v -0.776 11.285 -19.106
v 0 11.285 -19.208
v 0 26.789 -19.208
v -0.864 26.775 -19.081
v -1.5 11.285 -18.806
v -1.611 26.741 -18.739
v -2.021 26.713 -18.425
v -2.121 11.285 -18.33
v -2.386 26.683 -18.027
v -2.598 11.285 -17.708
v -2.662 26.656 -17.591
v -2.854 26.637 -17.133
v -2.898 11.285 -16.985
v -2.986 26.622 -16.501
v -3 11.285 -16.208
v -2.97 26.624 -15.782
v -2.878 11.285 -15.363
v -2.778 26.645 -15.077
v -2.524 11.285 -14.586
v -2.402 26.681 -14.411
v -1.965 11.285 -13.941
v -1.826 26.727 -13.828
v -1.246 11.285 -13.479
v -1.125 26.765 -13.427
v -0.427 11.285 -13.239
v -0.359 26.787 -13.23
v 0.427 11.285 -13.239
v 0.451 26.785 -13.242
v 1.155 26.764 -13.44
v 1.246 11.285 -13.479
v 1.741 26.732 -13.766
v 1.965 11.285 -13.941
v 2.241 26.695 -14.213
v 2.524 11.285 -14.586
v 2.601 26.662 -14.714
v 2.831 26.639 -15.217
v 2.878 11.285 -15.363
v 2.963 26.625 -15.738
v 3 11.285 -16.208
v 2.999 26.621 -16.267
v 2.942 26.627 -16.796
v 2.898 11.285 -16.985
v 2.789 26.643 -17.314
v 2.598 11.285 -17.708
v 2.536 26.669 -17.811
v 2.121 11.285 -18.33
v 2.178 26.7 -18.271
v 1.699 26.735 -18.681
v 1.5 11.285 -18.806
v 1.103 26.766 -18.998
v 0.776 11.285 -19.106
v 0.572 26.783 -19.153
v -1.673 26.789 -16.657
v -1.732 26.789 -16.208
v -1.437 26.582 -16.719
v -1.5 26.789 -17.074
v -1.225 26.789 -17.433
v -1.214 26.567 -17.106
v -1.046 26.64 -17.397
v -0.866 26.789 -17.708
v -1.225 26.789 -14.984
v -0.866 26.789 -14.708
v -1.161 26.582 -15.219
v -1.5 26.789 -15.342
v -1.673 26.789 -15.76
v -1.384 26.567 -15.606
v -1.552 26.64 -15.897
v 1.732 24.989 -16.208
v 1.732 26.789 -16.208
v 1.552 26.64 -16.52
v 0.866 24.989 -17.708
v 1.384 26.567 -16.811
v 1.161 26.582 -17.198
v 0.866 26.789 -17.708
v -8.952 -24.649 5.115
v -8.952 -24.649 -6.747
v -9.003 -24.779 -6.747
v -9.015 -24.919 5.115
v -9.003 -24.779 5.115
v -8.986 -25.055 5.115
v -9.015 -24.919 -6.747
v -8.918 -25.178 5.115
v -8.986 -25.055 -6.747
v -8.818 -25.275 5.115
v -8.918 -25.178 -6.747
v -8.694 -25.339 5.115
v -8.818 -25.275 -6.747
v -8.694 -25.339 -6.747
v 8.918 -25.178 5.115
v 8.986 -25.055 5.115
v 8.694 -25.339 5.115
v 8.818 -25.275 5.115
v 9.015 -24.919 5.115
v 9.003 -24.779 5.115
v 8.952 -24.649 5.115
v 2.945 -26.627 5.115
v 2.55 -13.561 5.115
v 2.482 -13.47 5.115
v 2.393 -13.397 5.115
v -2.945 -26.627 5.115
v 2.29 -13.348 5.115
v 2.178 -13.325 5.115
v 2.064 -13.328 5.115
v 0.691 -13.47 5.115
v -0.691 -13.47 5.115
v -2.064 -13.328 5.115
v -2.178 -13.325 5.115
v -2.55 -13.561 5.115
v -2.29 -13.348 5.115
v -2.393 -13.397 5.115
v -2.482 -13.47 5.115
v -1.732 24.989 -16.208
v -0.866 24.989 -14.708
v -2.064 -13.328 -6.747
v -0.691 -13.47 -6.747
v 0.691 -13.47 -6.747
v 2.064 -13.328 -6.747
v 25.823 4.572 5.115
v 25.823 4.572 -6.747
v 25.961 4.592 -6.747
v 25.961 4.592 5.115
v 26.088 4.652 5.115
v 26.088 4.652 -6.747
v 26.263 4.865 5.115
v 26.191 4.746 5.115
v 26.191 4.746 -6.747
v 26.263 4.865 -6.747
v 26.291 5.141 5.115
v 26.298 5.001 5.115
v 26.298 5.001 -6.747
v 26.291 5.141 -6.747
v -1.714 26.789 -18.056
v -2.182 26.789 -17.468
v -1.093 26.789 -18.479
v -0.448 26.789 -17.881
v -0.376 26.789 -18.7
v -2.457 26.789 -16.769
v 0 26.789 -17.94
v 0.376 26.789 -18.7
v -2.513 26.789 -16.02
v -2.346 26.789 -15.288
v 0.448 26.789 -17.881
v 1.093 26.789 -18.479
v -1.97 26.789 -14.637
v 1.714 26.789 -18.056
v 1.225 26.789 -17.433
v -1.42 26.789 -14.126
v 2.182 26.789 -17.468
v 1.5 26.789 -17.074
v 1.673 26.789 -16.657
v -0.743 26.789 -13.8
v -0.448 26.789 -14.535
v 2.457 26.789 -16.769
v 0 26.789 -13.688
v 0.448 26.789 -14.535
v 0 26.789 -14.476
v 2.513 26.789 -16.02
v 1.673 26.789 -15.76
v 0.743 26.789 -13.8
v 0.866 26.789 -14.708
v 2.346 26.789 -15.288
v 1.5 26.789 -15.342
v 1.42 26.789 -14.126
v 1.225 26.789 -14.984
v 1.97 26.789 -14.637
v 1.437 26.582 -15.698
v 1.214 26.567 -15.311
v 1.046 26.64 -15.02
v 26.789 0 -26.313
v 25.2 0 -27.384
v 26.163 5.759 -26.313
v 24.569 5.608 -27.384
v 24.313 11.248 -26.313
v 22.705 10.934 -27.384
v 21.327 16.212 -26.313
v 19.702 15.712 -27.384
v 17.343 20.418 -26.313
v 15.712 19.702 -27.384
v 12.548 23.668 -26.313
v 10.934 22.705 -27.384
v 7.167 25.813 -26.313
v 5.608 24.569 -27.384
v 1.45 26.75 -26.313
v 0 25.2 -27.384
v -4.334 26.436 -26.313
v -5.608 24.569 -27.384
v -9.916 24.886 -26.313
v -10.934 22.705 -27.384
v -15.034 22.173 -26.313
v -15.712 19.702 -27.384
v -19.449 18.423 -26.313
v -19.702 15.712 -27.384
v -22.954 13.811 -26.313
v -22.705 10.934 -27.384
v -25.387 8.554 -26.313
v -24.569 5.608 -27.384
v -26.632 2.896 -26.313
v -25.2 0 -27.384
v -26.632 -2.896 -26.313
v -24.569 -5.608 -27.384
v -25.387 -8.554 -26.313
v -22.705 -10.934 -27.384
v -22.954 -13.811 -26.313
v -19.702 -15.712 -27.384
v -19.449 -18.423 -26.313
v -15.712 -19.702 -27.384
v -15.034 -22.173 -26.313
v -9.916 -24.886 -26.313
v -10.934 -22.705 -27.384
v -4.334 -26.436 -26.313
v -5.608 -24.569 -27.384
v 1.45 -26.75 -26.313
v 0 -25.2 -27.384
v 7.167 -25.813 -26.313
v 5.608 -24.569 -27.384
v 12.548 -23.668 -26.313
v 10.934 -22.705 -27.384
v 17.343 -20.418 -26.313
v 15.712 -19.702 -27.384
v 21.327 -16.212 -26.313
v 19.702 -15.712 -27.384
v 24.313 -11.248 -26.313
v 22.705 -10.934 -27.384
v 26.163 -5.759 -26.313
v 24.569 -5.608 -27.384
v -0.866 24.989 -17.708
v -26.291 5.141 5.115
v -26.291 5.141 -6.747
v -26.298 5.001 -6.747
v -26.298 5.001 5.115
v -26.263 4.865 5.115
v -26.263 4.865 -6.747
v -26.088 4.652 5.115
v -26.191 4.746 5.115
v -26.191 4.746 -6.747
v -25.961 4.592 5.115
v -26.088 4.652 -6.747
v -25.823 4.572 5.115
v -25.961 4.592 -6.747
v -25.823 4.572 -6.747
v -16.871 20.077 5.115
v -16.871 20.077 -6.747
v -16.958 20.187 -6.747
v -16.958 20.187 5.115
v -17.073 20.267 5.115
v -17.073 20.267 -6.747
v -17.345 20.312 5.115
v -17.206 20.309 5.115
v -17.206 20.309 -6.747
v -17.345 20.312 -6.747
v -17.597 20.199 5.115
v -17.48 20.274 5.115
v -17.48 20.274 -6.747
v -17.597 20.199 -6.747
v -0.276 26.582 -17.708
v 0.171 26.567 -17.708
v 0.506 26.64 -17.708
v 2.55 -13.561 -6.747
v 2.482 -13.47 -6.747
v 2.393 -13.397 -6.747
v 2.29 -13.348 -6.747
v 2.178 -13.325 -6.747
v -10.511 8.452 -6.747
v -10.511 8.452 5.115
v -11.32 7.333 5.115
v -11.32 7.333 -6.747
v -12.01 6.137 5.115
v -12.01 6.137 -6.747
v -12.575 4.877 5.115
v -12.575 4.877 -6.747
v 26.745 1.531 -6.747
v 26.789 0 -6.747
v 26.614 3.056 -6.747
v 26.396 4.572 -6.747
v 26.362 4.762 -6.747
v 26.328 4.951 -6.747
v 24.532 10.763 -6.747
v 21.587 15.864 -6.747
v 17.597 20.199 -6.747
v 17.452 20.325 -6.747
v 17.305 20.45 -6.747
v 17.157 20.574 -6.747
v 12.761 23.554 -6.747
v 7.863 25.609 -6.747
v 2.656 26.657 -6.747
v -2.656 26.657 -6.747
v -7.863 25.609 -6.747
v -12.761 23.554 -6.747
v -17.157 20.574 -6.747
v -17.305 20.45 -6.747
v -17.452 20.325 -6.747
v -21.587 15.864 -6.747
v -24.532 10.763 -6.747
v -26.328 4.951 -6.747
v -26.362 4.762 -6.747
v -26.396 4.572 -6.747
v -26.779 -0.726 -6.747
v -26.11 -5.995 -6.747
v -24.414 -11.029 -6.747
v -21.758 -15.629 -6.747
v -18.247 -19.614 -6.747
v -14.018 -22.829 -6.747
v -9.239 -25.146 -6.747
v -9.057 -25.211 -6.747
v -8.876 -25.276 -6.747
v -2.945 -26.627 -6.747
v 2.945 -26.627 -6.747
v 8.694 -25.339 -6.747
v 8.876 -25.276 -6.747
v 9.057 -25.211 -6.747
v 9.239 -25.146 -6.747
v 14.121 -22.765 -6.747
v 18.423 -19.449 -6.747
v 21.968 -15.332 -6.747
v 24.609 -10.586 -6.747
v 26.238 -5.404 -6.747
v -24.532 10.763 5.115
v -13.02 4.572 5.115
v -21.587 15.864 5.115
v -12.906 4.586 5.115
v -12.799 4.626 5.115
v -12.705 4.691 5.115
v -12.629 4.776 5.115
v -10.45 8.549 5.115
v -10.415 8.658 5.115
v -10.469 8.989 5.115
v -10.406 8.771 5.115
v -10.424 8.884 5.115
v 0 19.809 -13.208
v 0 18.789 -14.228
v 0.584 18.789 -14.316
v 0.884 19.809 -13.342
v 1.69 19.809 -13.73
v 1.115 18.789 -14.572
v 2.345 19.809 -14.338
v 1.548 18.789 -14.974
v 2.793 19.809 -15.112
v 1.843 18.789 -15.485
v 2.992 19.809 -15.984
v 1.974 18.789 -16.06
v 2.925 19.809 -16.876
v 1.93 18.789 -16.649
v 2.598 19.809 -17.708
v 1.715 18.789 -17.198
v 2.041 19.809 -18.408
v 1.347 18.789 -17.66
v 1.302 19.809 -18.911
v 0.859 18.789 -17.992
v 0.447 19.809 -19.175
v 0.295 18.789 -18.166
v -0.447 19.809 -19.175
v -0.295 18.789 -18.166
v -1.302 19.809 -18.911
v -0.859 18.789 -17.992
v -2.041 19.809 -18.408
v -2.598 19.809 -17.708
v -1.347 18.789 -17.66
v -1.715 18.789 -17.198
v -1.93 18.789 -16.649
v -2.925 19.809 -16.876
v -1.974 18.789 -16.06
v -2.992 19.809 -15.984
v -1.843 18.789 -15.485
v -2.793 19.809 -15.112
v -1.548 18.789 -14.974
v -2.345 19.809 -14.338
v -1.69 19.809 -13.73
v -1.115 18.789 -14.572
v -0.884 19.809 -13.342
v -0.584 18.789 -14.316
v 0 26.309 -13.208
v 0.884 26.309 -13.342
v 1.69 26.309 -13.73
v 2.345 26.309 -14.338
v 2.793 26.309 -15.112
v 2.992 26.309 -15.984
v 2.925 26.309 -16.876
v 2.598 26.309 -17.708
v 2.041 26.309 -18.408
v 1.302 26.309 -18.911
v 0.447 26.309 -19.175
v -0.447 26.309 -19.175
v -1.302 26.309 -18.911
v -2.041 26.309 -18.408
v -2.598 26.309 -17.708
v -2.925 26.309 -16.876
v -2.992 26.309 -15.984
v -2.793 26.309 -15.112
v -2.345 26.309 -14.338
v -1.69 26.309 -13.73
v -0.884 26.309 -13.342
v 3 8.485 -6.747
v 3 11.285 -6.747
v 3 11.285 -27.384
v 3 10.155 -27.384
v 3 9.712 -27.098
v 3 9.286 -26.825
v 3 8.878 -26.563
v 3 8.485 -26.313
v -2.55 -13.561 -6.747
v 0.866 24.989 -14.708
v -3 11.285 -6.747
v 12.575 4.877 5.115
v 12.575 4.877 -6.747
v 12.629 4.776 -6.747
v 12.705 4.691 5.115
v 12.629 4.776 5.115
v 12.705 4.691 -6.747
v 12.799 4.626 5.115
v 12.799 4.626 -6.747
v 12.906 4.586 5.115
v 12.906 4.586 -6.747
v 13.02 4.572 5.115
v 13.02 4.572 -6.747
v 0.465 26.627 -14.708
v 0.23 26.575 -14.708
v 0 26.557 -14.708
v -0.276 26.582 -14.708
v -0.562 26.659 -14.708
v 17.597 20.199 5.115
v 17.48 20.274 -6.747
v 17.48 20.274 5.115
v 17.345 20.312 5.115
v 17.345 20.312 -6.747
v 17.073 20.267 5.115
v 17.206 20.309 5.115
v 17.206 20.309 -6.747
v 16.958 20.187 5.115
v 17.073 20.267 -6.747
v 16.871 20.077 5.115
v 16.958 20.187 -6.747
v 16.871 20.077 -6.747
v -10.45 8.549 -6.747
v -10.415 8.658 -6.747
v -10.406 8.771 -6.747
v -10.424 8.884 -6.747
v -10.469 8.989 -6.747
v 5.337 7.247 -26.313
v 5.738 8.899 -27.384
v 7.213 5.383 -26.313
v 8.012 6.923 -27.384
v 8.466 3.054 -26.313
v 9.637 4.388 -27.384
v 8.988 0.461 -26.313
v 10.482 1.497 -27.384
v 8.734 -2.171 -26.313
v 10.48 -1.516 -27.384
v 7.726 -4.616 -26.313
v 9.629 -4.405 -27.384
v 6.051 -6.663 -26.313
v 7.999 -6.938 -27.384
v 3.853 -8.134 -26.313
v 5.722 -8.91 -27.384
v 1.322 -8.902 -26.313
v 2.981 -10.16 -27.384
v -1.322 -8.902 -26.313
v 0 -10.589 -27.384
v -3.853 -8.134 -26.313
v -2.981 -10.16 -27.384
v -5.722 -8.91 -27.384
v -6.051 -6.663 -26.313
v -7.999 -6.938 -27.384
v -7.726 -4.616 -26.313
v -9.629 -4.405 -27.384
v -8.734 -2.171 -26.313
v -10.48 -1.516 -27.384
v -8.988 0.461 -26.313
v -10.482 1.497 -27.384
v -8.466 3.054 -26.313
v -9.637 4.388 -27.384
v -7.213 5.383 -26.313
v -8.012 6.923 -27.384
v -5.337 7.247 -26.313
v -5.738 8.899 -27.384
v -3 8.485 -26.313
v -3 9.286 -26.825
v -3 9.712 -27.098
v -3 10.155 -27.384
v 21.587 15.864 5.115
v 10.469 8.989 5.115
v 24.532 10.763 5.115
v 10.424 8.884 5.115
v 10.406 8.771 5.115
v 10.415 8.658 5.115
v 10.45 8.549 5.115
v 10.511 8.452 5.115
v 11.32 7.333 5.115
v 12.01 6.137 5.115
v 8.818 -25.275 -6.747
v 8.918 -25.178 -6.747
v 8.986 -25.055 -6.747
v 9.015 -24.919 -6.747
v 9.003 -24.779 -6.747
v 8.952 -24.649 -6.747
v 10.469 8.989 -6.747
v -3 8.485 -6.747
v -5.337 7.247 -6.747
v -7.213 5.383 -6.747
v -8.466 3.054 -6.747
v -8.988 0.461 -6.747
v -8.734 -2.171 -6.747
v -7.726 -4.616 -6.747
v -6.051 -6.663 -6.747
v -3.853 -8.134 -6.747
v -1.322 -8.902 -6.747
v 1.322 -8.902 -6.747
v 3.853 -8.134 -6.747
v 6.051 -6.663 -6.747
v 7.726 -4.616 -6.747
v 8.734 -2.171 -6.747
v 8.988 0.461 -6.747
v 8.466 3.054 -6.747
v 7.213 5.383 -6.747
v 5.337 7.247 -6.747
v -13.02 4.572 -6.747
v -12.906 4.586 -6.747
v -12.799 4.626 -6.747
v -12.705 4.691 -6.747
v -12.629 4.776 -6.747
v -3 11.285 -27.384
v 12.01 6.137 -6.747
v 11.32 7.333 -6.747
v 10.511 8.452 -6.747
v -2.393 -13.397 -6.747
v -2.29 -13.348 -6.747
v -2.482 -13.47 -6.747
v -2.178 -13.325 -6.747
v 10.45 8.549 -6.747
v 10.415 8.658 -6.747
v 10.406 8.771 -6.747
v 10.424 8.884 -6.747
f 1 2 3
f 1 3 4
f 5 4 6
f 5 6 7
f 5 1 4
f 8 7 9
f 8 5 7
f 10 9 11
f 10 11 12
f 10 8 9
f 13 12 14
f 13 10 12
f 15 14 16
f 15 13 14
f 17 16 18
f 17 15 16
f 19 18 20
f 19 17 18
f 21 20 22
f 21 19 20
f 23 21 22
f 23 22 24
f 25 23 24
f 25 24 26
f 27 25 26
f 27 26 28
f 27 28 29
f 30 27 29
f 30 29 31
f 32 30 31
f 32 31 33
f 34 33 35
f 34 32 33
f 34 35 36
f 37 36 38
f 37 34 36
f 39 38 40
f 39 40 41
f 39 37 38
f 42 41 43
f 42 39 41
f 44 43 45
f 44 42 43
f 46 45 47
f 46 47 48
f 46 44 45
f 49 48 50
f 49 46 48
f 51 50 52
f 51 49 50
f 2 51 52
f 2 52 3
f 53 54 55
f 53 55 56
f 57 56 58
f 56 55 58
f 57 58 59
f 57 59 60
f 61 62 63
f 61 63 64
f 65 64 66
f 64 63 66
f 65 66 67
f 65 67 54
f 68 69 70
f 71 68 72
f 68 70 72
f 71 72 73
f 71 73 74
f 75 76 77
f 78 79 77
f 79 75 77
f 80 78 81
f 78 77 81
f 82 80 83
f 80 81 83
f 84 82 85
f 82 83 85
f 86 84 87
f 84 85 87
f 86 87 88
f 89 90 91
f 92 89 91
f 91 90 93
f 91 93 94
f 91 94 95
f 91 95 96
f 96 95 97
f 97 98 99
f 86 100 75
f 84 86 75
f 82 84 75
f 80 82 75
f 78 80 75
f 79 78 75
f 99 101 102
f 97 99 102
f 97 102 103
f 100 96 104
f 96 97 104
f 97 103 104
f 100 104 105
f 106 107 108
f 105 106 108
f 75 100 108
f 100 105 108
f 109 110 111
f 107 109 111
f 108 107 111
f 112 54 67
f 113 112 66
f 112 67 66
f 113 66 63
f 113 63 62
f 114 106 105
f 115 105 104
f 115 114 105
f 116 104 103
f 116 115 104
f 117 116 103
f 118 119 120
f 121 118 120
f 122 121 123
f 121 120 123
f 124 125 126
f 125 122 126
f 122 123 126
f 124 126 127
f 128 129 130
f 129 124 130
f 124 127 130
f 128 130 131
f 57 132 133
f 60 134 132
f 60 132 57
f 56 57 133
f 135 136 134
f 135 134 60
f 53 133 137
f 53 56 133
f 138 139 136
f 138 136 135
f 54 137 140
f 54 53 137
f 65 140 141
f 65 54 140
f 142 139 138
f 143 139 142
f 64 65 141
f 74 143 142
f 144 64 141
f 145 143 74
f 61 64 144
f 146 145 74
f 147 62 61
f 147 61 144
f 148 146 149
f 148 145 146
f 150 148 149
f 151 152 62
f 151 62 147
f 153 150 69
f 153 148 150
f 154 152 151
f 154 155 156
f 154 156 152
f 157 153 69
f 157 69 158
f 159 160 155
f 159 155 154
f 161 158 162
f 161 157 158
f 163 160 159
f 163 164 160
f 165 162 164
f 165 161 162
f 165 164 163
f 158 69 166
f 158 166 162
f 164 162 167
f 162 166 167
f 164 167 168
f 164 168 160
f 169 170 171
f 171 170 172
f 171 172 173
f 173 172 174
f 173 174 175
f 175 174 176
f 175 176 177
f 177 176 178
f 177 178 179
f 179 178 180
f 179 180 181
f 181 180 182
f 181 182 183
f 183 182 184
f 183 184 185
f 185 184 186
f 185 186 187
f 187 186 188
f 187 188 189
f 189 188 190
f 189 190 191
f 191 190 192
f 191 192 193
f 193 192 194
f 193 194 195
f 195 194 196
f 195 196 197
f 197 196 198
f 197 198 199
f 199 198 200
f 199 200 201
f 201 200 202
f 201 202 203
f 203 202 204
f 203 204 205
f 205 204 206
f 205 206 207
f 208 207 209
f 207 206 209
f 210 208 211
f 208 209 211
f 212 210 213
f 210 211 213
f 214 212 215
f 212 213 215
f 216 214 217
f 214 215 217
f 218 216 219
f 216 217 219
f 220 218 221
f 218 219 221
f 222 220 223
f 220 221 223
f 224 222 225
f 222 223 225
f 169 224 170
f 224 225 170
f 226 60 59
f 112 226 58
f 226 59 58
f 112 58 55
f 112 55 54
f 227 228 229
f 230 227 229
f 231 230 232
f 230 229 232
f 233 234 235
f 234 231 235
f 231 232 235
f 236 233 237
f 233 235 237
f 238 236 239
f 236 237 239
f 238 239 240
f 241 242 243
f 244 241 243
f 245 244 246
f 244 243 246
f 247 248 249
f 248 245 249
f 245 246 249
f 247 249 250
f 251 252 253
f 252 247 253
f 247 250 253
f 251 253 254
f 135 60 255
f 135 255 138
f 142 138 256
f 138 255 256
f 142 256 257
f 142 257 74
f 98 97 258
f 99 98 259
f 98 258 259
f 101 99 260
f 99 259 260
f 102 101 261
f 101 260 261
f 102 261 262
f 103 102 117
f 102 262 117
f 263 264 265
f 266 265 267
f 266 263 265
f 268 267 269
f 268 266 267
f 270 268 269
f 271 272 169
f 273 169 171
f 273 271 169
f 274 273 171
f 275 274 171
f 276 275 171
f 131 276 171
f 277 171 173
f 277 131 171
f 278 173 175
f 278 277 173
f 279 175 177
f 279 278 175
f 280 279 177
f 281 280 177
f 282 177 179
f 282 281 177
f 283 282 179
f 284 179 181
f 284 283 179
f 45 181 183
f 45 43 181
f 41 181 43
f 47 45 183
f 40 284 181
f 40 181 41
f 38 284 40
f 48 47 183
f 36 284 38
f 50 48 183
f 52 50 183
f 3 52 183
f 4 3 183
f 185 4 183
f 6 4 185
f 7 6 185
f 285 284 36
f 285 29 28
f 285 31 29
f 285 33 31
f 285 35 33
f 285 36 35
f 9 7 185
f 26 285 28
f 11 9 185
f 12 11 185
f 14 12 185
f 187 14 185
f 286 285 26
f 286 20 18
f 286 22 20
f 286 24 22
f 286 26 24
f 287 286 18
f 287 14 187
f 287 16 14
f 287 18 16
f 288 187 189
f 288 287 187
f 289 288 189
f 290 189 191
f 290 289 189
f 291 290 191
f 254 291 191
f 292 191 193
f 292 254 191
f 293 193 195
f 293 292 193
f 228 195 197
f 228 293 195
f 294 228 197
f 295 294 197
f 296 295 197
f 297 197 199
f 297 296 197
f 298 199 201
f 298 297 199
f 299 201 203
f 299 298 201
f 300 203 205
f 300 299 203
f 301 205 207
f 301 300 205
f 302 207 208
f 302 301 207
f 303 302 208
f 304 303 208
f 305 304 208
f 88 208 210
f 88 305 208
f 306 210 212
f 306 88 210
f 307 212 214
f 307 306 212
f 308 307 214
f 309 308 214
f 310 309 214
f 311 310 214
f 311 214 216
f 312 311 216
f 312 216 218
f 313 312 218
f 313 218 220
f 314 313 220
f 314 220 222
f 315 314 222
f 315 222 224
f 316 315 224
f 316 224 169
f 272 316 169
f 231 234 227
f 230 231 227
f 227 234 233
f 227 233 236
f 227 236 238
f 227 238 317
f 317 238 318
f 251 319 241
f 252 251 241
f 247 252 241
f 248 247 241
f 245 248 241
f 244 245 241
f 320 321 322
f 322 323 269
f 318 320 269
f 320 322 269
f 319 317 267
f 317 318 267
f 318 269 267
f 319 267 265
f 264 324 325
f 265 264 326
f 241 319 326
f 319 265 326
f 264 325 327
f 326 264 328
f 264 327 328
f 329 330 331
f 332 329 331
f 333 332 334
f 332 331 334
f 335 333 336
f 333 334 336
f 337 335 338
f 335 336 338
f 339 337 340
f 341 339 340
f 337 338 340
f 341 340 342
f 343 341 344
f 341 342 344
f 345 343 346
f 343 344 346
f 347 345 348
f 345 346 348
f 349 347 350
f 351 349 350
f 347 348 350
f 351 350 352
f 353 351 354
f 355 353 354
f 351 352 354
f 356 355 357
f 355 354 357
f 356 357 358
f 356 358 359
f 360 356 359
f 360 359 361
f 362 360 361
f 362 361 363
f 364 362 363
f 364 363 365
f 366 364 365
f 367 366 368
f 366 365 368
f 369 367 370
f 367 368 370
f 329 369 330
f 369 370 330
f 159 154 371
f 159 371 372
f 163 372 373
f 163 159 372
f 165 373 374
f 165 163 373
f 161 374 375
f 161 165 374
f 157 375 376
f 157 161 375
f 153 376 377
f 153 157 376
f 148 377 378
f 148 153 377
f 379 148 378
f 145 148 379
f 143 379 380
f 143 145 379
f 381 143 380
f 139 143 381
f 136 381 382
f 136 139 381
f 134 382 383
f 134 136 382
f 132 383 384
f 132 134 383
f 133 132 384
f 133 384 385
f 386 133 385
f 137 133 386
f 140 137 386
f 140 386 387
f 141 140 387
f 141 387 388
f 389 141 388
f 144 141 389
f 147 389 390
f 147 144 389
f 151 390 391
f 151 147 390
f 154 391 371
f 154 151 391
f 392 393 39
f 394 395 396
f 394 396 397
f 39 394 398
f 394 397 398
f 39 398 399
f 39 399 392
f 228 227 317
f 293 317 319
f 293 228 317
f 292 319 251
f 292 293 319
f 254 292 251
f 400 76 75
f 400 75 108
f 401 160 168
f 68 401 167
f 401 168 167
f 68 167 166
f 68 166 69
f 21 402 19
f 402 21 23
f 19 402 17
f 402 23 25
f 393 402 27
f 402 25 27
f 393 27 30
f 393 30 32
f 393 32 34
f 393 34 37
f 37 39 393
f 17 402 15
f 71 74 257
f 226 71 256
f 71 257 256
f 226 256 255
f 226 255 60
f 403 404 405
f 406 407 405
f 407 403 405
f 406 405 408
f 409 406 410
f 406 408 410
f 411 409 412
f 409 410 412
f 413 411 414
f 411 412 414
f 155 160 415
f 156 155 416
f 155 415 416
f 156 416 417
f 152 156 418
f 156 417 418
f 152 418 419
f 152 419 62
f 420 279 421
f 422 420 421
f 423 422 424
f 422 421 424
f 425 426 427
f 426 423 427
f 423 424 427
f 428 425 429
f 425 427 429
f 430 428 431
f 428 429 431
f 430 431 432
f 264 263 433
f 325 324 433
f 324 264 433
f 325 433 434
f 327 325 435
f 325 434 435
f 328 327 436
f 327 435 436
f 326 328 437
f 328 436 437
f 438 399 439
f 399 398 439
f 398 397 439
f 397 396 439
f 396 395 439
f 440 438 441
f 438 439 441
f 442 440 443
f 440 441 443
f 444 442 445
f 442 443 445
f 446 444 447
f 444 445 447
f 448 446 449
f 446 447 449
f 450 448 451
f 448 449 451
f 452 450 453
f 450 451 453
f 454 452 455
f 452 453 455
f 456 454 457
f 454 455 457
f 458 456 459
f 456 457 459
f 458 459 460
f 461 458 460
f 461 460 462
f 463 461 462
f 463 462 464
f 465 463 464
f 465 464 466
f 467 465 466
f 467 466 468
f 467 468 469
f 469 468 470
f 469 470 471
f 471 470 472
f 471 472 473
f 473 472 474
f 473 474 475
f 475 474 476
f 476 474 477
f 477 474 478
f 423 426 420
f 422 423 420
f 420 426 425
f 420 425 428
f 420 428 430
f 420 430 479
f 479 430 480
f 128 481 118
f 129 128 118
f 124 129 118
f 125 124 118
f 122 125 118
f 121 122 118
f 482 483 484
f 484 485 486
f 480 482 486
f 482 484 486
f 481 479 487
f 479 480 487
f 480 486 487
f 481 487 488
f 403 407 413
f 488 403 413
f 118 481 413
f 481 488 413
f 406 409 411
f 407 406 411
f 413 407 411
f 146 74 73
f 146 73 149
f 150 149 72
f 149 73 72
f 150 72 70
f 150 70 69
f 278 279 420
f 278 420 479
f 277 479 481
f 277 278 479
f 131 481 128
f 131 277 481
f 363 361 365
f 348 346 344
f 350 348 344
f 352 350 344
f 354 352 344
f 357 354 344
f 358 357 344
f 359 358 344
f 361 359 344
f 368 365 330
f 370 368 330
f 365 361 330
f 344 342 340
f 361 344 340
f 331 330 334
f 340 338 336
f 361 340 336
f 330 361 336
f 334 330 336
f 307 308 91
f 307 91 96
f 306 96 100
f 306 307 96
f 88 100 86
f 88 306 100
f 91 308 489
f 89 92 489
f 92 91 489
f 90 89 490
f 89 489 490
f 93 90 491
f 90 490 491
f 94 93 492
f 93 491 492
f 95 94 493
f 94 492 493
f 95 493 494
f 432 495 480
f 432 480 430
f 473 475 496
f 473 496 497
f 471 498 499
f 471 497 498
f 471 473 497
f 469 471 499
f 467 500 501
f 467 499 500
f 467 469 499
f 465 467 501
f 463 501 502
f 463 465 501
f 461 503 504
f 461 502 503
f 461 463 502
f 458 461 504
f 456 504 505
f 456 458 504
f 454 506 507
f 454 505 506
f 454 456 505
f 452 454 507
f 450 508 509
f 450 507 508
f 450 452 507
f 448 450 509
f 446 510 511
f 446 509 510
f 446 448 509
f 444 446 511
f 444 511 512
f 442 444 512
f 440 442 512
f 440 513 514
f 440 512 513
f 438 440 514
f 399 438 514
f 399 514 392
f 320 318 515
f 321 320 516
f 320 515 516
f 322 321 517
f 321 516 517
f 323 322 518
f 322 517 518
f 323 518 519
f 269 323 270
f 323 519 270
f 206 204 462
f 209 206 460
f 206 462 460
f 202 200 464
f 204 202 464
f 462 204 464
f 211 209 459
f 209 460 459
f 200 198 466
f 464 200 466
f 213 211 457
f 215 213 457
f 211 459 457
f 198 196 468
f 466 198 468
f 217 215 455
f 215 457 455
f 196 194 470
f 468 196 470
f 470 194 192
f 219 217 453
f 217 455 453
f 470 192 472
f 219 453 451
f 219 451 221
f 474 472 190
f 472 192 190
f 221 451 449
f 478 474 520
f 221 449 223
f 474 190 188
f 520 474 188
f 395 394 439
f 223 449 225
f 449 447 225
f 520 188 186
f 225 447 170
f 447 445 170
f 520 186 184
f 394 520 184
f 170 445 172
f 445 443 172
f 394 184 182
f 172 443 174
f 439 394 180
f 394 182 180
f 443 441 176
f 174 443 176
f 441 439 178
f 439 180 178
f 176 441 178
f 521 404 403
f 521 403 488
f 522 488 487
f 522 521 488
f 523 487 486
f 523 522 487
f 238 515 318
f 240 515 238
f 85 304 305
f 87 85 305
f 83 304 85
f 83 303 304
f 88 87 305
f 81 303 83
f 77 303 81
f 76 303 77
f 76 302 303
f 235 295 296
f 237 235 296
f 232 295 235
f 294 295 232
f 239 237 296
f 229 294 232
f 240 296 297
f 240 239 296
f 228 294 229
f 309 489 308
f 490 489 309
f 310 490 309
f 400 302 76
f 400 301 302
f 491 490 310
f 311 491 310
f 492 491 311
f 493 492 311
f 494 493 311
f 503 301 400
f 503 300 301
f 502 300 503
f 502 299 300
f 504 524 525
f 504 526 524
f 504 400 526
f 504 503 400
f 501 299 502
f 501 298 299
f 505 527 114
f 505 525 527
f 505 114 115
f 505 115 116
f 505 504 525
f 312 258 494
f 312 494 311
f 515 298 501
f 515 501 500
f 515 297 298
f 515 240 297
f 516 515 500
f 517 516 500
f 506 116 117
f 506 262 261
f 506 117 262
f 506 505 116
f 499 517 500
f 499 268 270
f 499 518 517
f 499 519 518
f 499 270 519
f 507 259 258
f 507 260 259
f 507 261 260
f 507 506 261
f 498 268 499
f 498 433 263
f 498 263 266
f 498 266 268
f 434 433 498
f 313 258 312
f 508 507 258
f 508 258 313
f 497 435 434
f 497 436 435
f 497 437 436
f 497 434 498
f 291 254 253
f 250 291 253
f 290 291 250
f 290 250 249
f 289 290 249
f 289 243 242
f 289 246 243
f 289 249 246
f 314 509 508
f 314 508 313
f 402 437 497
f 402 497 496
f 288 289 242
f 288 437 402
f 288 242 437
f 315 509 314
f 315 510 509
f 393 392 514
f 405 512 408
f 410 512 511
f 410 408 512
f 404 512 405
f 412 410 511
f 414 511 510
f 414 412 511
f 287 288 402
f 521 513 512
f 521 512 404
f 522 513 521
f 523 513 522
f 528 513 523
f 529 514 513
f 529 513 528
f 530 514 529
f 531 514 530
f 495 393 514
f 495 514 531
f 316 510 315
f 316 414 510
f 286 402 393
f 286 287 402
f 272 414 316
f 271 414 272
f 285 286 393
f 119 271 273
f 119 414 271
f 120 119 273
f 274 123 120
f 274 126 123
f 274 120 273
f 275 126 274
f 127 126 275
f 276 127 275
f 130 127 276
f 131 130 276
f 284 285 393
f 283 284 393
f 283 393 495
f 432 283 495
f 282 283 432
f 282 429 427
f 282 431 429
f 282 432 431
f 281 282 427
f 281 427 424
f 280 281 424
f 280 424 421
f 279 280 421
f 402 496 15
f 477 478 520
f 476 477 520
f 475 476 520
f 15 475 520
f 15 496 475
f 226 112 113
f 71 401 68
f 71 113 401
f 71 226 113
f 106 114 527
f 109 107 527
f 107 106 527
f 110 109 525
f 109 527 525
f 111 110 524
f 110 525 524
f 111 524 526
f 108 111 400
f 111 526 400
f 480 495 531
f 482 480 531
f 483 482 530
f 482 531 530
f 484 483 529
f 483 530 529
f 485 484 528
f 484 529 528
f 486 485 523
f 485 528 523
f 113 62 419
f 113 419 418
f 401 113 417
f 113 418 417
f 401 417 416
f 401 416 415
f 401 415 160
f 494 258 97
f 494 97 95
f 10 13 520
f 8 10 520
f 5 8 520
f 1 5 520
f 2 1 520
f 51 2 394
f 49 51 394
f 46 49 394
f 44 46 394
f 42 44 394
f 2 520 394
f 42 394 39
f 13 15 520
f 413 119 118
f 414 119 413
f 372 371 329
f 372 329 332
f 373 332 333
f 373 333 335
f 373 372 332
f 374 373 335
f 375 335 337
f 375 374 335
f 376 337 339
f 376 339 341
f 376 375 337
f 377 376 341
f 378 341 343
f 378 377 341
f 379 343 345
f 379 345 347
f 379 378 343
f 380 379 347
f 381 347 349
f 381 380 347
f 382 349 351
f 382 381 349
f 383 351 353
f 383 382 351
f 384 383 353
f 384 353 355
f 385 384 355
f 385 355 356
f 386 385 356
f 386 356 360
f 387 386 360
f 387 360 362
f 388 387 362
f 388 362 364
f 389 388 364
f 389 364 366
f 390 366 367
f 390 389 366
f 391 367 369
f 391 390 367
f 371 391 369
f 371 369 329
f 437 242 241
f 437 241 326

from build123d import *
from OCP.BRepFilletAPI import BRepFilletAPI_MakeChamfer

# Parameters (mm, degrees)
BOSS_EXTRUDE1_START      = -6.746875
SKETCH1_R                = 26.7890625
BOSS_EXTRUDE1_DEPTH      = 20.6375
BOSS_EXTRUDE2_DEPTH      = 11.8618
FILLET1_R                = 0.476990821
CIRPATTERN1_COUNT        = 3
FILLET1_OF_CIRPATTERN1_R = 0.476990821
CUT_EXTRUDE5_DEPTH       = 47.746248335
CUT_EXTRUDE5_DEPTH_BACK  = 47.746248335
SKETCH15_R               = 9
CHAMFER1_SIZE            = 1.0715625
CHAMFER1_SIZE2           = 1.588656738
CUT_EXTRUDE1_DEPTH       = 47.746248335
CUT_EXTRUDE1_DEPTH_BACK  = 47.746248335
SKETCH5_R                = 3
CUT_EXTRUDE2_DEPTH       = 47.746248335
SKETCH6_R                = 3
BOSS_EXTRUDE3_DEPTH      = 8
CUT_EXTRUDE3_DEPTH       = 1.8
CHAMFER3_SIZE            = 0.48
CHAMFER4_SIZE            = 1.02


with BuildPart() as part:
    # Sketch1 → Boss-Extrude1 (new body)
    with BuildSketch(Plane.XY.offset(BOSS_EXTRUDE1_START)):
        Circle(SKETCH1_R)
    extrude(amount=-BOSS_EXTRUDE1_DEPTH)

    # Sketch2 → Boss-Extrude2 (add)
    with BuildSketch(Plane.XY.offset(-6.746875)):
        with BuildLine():
            Line((-9.238549561, -25.145637229), (-2.384954104, -13.274861682))
            ThreePointArc((-2.384954104, -13.274861682), (0, -13.4874), (2.384954104, -13.274861682))
            Line((2.384954104, -13.274861682), (9.238549561, -25.145637229))
            ThreePointArc((9.238549561, -25.145637229), (0, -26.7890625), (-9.238549561, -25.145637229))
        make_face()
    boss_extrude2 = extrude(amount=BOSS_EXTRUDE2_DEPTH)

    # Fillet1
    # the kernel refuses this fillet: 0.476990821 mm, written as the material it takes off along each edge
    with BuildSketch(Plane(origin=(-9.238549561, -25.145637229, -6.746875), x_dir=(0.9423194959651416, -0.33471475546202245, 0), z_dir=(0, 0, 1))) as fillet1_piece_1:
        with BuildLine():
            CenterArc((0.572952448, 0.476963054), FILLET1_R, 169.55519331, 101.063030663)
            Line((0.103865366, 0.563435893), (0, 0))
            ThreePointArc((0, 0), (0.28904955, -0.001559444), (0.5780991, 0))
        make_face()
    extrude(amount=13.307047751, mode=Mode.SUBTRACT)
    with BuildSketch(Plane(origin=(9.238549561, -25.145637229, -6.746875), x_dir=(-0.9423194959651411, -0.3347147554620237, 0), z_dir=(0, 0, 1))) as fillet1_piece_2:
        with BuildLine():
            CenterArc((0.572952448, -0.476963054), FILLET1_R, 89.381776027, 101.063030663)
            Line((0.103865366, -0.563435893), (0, 0))
            ThreePointArc((0, 0), (0.28904955, 0.001559444), (0.5780991, 0))
        make_face()
    extrude(amount=13.307047751, mode=Mode.SUBTRACT)
    with BuildSketch(Plane(origin=(2.384954104, -13.274861682, -6.746875), x_dir=(0.49999999999999706, -0.8660254037844404, 0), z_dir=(0, 0, 1))) as fillet1_piece_3:
        with BuildLine():
            CenterArc((0.330829178, -0.476990821), FILLET1_R, 90, 68.803855098)
            ThreePointArc((-0.113892323, -0.304529143), (-0.056028498, -0.152607773), (0, 0))
            Line((0, 0), (0.330829178, 0))
        make_face()
    extrude(amount=12.688872944, mode=Mode.SUBTRACT)
    with BuildSketch(Plane(origin=(-2.384954104, -13.274861682, -6.746875), x_dir=(0.9863015455813384, -0.16495229972286882, 0), z_dir=(0, 0, 1))) as fillet1_piece_4:
        with BuildLine():
            CenterArc((0.330879129, -0.476956172), FILLET1_R, 90.690608377, 68.803855098)
            Line((-0.115888763, -0.309867293), (0, 0))
            ThreePointArc((0, 0), (0.162564956, -0.000979741), (0.325129912, 0))
        make_face()
    extrude(amount=12.688872944, mode=Mode.SUBTRACT)

    # CirPattern1: Boss-Extrude2 ×3 about axis
    cirpattern1_axis = Axis((0, 0, 0), (0, 0, 1))
    for i in range(1, CIRPATTERN1_COUNT):
        add(boss_extrude2.rotate(cirpattern1_axis, i * 360 / CIRPATTERN1_COUNT))

    # Fillet1 of CirPattern1
    # the kernel refuses this fillet: 0.476990821 mm, written as the material it takes off along each edge
    with BuildSketch(Plane(origin=(26.396035415, 4.572, -6.746875), x_dir=(-0.18128826673094764, 0.9834299997181745, 0), z_dir=(0, 0, 1)), Plane(origin=(-17.157485854, 20.573637229, -6.746875), x_dir=(-0.761031229234182, -0.6487152442561451, 0), z_dir=(0, 0, 1))) as fillet1_of_cirpattern1_piece_1:
        with BuildLine():
            CenterArc((0.572952448, 0.476963054), FILLET1_OF_CIRPATTERN1_R, 169.55519331, 101.063030663)
            Line((0.103865366, 0.563435893), (0, 0))
            ThreePointArc((0, 0), (0.28904955, -0.001559444), (0.5780991, 0))
        make_face()
    extrude(amount=13.307047751, mode=Mode.SUBTRACT)
    with BuildSketch(Plane(origin=(17.157485854, 20.573637229, -6.746875), x_dir=(0.7610312292341833, -0.6487152442561435, 0), z_dir=(0, 0, 1)), Plane(origin=(-26.396035415, 4.572, -6.746875), x_dir=(0.181288266730962, 0.9834299997181718, 0), z_dir=(0, 0, 1))) as fillet1_of_cirpattern1_piece_2:
        with BuildLine():
            CenterArc((0.572952448, -0.476963054), FILLET1_OF_CIRPATTERN1_R, 89.381776027, 101.063030663)
            Line((0.103865366, -0.563435893), (0, 0))
            ThreePointArc((0, 0), (0.28904955, 0.001559444), (0.5780991, 0))
        make_face()
    extrude(amount=13.307047751, mode=Mode.SUBTRACT)
    with BuildSketch(Plane(origin=(10.303890396, 8.702861682, -6.746875), x_dir=(0.5000000000000006, 0.8660254037844383, 0), z_dir=(0, 0, 1)), Plane(origin=(-12.688844501, 4.572, -6.746875), x_dir=(-1, 0, 0), z_dir=(0, 0, 1))) as fillet1_of_cirpattern1_piece_3:
        with BuildLine():
            CenterArc((0.330829178, -0.476990821), FILLET1_OF_CIRPATTERN1_R, 90, 68.803855098)
            ThreePointArc((-0.113892323, -0.304529143), (-0.056028498, -0.152607773), (0, 0))
            Line((0, 0), (0.330829178, 0))
        make_face()
    extrude(amount=12.688872944, mode=Mode.SUBTRACT)
    with BuildSketch(Plane(origin=(12.688844501, 4.572, -6.746875), x_dir=(-0.3502978908180006, 0.9366383441267288, 0), z_dir=(0, 0, 1)), Plane(origin=(-10.303890396, 8.702861682, -6.746875), x_dir=(-0.6360036547633316, -0.7716860444038657, 0), z_dir=(0, 0, 1))) as fillet1_of_cirpattern1_piece_4:
        with BuildLine():
            CenterArc((0.330879129, -0.476956172), FILLET1_OF_CIRPATTERN1_R, 90.690608377, 68.803855098)
            Line((-0.115888763, -0.309867293), (0, 0))
            ThreePointArc((0, 0), (0.162564956, -0.000979741), (0.325129912, 0))
        make_face()
    extrude(amount=12.688872944, mode=Mode.SUBTRACT)

    # Sketch15 → Cut-Extrude5 (cut, two sides: drawn at the far end of the back side and taken through both)
    with BuildSketch(Plane.XY.offset(-CUT_EXTRUDE5_DEPTH_BACK)):
        Circle(SKETCH15_R)
    extrude(amount=CUT_EXTRUDE5_DEPTH + CUT_EXTRUDE5_DEPTH_BACK, mode=Mode.SUBTRACT)

    # Chamfer1: one chamfer whose edges measure the first distance from different faces: ONE call of the kernel's chamfer builder (chamfer() names one face for all edges)
    chamfer1_edges_1 = [part.edges().sort_by_distance(p)[0] for p in [
        (-26.7890625, 0, -27.384375),
    ]]
    chamfer1_side_1 = [part.faces().sort_by_distance(p)[0] for p in [
        (-26.7890625, 0, -17.065625),
    ]]
    chamfer1_edges_2 = [part.edges().sort_by_distance(p)[0] for p in [
        (-9, 0, -27.384375),
    ]]
    chamfer1_side_2 = [part.faces().sort_by_distance(p)[0] for p in [
        (-9, 0, -17.065625),
    ]]
    chamfer1 = BRepFilletAPI_MakeChamfer(part.part.solid().wrapped)
    for e in chamfer1_edges_1:
        chamfer1.Add(CHAMFER1_SIZE, CHAMFER1_SIZE2, e.wrapped, chamfer1_side_1[0].wrapped)  # the first distance lies on this face
    for e in chamfer1_edges_2:
        chamfer1.Add(CHAMFER1_SIZE, CHAMFER1_SIZE2, e.wrapped, chamfer1_side_2[0].wrapped)  # the first distance lies on this face
    add(Compound.cast(chamfer1.Shape()), mode=Mode.REPLACE)

    # Sketch4 → Cut-Extrude1 (cut, two sides: drawn at the far end of the back side and taken through both)
    with BuildSketch(Plane.XY.offset(-CUT_EXTRUDE1_DEPTH_BACK)):
        with BuildLine():
            Line((-3, 11.285281374), (3, 11.285281374))
            Line((3, 11.285281374), (3, 8.485281374))
            ThreePointArc((3, 8.485281374), (0, 9), (-3, 8.485281374))
            Line((-3, 8.485281374), (-3, 11.285281374))
        make_face()
    extrude(amount=CUT_EXTRUDE1_DEPTH + CUT_EXTRUDE1_DEPTH_BACK, mode=Mode.SUBTRACT)

    # Sketch5 → Cut-Extrude2 (cut, through all)
    with BuildSketch(Plane(origin=(0, 0, 0), x_dir=(1, 0, 0), z_dir=(0, 1, 0))):
        with Locations(Location((0, 16.208375, 0), (0, 0, 90))):
            Circle(SKETCH5_R)
    extrude(amount=CUT_EXTRUDE2_DEPTH, mode=Mode.SUBTRACT)


with BuildPart() as body_2:
    # Sketch6 → Boss-Extrude3 (new body)
    with BuildSketch(Plane(origin=(0, 26.7890625, 0), x_dir=(-1, 0, 0), z_dir=(0, 1, 0))):
        with Locations(Location((0, -16.208375, 0), (0, 0, 90))):
            Circle(SKETCH6_R)
    extrude(amount=-BOSS_EXTRUDE3_DEPTH)

    # Sketch8 → Cut-Extrude3 (cut)
    with BuildSketch(Plane(origin=(0, 26.7890625, 0), x_dir=(1, 0, 0), z_dir=(0, 1, 0))):
        Polygon((0.866025404, 14.708375), (1.732050808, 16.208375), (0.866025404, 17.708375), (-0.866025404, 17.708375), (-1.732050808, 16.208375), (-0.866025404, 14.708375), align=None)
    extrude(amount=-CUT_EXTRUDE3_DEPTH, mode=Mode.SUBTRACT)

    # Cut-Extrude4 cone 1 section (through the dimple's axis) → Cut-Extrude4 (revolve, cut)
    with BuildSketch(Plane(origin=(0, 26.7890625, -16.208375), x_dir=(0, 0, 1), z_dir=(1, 0, 0))):
        Polygon((0, 0), (1.732050808, 0), (0, 1.732050808), align=None)
    revolve(axis=Axis((0, 26.7890625, -16.208375), (0, -1, 0)), mode=Mode.SUBTRACT)

    # Chamfer3
    chamfer3_edges = [body_2.edges().sort_by_distance(p)[0] for p in [
        (0, 26.7890625, -19.208375),
    ]]
    chamfer(chamfer3_edges, length=CHAMFER3_SIZE)

    # Chamfer4
    chamfer4_edges = [body_2.edges().sort_by_distance(p)[0] for p in [
        (0, 18.7890625, -19.208375),
    ]]
    chamfer(chamfer4_edges, length=CHAMFER4_SIZE)


solid = Compound([part.part, body_2.part])
